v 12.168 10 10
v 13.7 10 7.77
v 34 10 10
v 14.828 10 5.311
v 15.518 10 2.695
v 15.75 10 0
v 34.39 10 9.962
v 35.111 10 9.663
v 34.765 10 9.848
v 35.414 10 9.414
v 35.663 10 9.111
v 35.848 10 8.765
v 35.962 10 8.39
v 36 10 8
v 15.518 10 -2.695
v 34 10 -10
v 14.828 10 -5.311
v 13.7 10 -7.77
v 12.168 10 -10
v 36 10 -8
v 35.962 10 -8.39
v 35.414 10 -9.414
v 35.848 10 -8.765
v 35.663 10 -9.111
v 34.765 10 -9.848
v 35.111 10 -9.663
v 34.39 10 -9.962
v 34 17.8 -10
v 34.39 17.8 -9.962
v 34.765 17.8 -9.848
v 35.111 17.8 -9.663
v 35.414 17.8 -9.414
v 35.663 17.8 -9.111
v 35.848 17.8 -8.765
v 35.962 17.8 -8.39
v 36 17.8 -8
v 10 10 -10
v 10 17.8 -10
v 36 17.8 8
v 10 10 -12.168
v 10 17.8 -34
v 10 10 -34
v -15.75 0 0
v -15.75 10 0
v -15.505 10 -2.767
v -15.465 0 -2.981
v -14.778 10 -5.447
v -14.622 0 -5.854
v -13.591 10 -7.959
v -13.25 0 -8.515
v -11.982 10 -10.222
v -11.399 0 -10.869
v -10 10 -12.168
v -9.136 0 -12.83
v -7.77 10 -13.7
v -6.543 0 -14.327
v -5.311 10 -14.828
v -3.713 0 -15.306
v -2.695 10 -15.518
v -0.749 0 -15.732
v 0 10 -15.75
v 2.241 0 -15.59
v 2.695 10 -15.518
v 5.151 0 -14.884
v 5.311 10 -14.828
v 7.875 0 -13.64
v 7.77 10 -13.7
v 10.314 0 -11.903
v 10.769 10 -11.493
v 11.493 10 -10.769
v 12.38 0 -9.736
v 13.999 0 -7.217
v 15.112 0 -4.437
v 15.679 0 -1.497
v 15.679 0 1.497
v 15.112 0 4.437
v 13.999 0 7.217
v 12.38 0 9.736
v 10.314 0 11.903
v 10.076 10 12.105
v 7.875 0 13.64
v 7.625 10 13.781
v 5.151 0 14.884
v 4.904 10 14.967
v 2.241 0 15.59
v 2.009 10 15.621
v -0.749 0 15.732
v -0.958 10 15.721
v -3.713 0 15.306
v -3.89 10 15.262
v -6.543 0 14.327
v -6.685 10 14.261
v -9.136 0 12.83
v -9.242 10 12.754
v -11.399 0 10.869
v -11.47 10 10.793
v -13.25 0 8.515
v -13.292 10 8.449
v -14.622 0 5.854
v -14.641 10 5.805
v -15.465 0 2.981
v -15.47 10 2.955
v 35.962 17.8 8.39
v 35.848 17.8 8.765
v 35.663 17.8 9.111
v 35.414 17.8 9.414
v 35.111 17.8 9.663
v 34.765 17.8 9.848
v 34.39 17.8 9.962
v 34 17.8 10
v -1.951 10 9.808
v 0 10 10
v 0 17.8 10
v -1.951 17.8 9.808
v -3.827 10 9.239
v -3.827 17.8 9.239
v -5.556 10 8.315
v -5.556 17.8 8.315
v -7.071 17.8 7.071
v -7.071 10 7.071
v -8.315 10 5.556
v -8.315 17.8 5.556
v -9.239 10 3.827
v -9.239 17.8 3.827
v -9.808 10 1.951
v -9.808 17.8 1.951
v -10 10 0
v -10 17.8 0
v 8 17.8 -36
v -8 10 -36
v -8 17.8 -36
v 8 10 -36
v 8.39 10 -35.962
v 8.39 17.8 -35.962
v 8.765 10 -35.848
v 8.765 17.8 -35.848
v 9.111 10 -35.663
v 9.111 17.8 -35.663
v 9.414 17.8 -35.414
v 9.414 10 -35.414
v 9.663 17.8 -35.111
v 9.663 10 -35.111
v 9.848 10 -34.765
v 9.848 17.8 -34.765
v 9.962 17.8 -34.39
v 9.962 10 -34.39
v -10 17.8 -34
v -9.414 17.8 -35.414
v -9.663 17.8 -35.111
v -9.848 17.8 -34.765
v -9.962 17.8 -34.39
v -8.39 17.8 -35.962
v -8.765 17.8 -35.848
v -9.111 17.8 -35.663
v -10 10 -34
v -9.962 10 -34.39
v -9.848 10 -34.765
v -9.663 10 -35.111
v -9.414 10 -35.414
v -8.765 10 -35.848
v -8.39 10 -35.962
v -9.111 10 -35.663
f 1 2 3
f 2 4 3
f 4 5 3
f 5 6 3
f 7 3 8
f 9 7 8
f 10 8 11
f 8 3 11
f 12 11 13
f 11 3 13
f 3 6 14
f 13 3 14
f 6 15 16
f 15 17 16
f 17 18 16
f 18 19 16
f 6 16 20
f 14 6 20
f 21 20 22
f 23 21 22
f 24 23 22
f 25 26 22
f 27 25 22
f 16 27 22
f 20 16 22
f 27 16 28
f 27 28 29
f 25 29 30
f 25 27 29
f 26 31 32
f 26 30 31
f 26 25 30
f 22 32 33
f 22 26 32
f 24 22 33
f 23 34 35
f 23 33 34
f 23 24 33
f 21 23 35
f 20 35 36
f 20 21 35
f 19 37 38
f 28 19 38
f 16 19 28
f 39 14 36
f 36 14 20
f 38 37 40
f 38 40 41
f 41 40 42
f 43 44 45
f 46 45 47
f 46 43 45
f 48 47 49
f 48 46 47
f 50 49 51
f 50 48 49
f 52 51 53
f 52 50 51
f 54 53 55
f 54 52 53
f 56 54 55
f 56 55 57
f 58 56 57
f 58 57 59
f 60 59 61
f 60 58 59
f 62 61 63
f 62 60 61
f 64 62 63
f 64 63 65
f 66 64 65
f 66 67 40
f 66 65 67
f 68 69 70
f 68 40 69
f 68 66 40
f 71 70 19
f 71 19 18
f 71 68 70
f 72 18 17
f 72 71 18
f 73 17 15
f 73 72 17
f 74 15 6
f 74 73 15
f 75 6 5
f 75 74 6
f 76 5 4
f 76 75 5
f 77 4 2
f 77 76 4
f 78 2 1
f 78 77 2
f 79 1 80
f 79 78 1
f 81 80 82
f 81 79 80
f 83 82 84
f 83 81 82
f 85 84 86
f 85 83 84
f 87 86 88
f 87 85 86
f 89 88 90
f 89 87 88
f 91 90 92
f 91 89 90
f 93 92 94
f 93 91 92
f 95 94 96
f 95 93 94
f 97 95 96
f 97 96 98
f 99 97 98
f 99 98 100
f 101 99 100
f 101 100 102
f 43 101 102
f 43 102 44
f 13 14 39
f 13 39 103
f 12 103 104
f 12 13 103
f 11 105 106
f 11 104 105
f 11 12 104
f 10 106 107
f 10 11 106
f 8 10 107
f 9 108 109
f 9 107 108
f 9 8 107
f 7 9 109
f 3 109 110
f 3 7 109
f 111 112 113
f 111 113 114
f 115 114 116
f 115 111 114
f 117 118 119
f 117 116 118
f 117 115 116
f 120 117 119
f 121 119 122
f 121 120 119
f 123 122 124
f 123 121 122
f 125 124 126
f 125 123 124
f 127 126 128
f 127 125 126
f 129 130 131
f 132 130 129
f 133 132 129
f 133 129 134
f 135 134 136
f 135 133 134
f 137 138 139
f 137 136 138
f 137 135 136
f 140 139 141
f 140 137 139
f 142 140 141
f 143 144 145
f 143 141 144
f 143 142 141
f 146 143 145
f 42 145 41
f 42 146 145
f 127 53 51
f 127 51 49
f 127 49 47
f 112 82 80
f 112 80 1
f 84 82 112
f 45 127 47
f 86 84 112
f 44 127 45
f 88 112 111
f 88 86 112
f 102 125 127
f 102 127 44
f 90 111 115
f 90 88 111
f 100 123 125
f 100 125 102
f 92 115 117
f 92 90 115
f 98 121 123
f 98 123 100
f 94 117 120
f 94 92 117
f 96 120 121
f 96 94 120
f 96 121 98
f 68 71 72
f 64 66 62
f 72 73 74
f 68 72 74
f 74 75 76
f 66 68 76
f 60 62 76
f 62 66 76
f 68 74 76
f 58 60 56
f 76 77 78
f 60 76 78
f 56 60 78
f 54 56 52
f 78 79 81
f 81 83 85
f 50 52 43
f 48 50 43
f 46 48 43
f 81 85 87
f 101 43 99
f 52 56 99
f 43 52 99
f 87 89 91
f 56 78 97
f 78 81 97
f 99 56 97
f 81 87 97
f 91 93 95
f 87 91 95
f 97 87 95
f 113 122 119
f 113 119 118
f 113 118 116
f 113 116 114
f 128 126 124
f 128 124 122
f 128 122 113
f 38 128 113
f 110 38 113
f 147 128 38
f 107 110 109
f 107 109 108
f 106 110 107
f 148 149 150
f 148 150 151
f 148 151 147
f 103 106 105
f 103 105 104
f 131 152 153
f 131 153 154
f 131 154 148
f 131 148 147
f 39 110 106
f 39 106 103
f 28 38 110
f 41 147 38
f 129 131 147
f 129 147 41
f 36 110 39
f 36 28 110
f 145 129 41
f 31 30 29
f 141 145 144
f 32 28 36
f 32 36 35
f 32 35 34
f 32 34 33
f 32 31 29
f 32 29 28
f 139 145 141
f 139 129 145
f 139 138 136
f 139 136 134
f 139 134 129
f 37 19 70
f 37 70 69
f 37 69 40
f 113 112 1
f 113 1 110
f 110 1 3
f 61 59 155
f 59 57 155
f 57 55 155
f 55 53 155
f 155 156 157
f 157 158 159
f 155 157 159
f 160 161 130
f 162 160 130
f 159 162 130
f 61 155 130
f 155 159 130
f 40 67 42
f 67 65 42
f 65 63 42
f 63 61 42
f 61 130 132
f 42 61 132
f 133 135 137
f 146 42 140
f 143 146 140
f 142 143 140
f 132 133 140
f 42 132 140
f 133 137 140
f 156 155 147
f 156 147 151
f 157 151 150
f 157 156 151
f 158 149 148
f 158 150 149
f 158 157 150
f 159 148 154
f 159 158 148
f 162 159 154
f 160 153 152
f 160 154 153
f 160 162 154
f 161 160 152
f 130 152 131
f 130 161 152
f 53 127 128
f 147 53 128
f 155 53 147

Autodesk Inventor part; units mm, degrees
ref_plane "YZ Plane" through (0, 0, 0) normal (1, 0, 0) x (0, 1, 0)
ref_plane "XZ Plane" through (0, 0, 0) normal (0, 1, 0) x (-1, 0, 0)
ref_plane "XY Plane" through (0, 0, 0) normal (0, 0, 1) x (1, 0, 0)
sketch "Sketch1" plane through (0, 0, 0) normal (0, 1, 0) x (-1, 0, 0)
  circle A0 centre (0, 0) radius 15.75
  dimension "d0" = 31.5
extrude "Extrusion1" add sketch "Sketch1" along normal blind 10
sketch "Sketch2" plane through (0, 10, 0) normal (0, 1, 0) x (1, 0, 0)
  circle A0 centre (0, 0) radius 10
  line L0 (0, -10) -> (34, -10)
  line L1 (-10, 0) -> (-10, 34)
  line L2 (0, 10) -> (34, 10)
  line L3 (10, 0) -> (10, 34)
  line L4 (-8, 36) -> (8, 36)
  line L5 (36, -8) -> (36, 8)
  arc A1 (34, -10) -> (36, -8) centre (34, -8) ccw
  arc A2 (36, 8) -> (34, 10) centre (34, 8) ccw
  arc A3 (10, 34) -> (8, 36) centre (8, 34) ccw
  arc A4 (-8, 36) -> (-10, 34) centre (-8, 34) ccw
  point P0 (36, -10)
  point P1 (-10, 36)
  point P2 (10, 10)
  dimension "d3" = 20
  dimension "d4" = 36
  dimension "d5" = 36
  dimension "d6" = 2
  dimension "d7" = 20
  dimension "d8" = 20
extrude "Extrusion2" add sketch "Sketch2" along normal blind 7.8
properties part number "Door Lock"
